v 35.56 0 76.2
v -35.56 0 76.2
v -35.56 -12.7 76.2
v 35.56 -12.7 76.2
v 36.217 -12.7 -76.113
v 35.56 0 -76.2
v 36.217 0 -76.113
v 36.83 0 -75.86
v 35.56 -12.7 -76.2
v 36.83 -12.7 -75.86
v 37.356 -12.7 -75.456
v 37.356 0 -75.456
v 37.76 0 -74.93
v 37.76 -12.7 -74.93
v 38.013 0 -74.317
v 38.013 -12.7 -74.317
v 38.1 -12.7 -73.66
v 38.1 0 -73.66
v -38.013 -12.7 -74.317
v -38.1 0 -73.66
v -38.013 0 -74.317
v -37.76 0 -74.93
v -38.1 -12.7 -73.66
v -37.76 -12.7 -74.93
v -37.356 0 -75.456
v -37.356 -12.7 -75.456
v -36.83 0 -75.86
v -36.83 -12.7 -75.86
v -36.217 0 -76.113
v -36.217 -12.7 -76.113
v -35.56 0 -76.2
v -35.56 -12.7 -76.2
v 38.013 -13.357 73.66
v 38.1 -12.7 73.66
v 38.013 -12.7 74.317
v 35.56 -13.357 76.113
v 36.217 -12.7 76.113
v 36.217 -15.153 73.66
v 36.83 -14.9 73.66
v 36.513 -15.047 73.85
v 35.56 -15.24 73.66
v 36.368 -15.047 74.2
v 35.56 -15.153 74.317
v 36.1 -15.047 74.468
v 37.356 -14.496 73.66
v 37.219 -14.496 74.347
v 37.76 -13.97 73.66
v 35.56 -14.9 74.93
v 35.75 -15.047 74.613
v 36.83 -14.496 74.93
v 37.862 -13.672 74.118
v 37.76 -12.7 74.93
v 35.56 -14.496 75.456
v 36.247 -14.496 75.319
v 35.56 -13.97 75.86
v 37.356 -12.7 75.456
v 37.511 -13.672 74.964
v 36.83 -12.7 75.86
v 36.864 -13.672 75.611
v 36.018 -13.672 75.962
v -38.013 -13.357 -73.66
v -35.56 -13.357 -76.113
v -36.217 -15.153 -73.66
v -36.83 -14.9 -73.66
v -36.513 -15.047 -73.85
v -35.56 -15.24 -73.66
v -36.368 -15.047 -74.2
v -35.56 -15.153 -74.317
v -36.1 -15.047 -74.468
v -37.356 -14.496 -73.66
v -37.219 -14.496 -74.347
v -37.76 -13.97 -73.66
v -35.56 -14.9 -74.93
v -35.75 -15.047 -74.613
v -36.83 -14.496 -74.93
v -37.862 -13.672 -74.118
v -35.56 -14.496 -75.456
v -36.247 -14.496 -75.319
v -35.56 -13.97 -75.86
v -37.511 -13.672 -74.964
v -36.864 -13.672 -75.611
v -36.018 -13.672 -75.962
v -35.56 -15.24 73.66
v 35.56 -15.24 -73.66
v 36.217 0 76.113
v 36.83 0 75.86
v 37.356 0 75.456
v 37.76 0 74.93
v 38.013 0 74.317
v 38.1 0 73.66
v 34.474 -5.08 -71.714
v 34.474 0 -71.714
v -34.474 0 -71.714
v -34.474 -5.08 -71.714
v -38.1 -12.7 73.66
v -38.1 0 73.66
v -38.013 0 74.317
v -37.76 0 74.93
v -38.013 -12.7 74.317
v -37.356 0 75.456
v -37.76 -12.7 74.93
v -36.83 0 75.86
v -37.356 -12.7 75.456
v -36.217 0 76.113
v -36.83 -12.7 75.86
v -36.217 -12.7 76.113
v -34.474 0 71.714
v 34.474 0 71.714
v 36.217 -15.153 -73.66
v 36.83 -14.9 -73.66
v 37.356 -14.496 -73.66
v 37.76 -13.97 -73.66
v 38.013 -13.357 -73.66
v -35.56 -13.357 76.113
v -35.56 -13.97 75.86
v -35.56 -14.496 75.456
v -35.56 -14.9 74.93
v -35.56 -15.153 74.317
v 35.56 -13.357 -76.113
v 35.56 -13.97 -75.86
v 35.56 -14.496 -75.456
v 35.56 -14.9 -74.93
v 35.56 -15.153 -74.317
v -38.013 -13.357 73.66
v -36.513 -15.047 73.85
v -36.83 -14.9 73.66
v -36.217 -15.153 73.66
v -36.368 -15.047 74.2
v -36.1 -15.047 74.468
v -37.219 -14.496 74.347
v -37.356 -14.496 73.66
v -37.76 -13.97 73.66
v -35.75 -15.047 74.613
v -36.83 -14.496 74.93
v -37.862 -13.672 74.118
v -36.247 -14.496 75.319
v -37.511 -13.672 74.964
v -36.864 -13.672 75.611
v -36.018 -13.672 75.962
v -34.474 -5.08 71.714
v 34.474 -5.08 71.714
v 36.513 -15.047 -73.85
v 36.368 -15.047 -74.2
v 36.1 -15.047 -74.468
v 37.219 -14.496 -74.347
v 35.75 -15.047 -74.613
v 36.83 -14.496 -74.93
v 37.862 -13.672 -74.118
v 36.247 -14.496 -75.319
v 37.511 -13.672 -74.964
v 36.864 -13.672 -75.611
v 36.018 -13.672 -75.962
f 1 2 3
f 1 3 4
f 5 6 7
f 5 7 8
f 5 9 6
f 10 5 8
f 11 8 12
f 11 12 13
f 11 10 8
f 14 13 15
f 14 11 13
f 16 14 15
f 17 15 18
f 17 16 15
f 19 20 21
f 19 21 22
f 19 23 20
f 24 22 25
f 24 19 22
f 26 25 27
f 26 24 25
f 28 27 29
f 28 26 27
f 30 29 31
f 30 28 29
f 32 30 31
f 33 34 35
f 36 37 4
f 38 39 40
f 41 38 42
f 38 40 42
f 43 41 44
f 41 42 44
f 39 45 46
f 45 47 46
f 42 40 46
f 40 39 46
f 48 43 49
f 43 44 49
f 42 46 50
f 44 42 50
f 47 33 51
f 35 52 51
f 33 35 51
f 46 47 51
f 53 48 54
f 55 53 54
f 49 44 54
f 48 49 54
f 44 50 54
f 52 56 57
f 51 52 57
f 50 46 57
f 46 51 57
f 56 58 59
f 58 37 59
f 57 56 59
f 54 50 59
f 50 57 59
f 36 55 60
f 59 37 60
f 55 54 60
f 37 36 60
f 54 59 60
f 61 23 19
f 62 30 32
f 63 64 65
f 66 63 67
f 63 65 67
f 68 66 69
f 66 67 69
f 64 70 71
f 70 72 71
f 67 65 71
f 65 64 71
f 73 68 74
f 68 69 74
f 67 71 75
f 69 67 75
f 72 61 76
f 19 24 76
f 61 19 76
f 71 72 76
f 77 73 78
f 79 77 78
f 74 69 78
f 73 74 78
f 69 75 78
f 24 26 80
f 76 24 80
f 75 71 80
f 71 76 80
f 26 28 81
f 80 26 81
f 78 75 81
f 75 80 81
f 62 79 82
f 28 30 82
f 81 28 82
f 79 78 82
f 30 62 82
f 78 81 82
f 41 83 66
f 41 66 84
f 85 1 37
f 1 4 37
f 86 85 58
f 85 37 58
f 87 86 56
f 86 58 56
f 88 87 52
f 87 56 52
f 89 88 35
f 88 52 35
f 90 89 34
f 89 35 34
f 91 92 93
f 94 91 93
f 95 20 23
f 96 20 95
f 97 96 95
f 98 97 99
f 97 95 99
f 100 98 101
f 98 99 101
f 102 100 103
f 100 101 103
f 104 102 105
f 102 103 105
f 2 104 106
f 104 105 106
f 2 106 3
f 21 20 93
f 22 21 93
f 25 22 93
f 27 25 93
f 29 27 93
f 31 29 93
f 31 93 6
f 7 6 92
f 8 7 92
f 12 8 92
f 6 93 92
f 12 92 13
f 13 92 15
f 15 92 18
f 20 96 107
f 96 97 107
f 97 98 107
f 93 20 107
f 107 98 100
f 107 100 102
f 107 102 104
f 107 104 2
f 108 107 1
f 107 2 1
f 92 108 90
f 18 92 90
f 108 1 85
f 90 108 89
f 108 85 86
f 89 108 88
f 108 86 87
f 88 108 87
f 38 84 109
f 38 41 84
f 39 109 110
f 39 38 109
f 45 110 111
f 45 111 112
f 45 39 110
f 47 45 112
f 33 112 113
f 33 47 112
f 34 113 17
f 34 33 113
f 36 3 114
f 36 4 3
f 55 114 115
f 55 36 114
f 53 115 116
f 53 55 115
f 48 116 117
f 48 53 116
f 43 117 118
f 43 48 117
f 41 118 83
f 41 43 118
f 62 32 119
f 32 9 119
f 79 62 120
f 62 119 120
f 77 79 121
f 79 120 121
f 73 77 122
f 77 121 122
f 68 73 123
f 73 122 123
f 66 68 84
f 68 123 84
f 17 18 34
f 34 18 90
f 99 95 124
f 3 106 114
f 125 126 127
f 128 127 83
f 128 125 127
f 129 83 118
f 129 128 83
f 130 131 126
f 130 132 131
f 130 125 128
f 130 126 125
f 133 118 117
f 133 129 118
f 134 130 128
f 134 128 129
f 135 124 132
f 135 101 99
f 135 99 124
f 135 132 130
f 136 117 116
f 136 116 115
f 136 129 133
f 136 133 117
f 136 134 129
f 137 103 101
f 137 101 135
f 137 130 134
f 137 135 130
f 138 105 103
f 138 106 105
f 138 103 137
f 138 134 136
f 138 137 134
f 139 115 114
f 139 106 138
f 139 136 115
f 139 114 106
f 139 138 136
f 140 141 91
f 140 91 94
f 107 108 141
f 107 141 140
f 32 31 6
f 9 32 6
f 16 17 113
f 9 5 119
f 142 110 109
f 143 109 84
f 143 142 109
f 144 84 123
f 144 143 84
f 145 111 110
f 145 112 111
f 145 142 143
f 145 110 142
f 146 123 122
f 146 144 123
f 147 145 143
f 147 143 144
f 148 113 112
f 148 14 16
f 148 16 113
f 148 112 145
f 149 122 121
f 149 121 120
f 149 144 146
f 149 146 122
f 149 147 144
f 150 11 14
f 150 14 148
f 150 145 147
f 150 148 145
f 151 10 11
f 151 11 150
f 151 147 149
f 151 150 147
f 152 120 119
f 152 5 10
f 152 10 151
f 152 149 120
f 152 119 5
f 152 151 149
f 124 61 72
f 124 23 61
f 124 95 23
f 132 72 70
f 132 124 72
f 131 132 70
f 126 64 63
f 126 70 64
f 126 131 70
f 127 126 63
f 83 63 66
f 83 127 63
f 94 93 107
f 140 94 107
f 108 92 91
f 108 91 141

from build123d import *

# Parameters (mm, degrees)
F0_W     = 76.2
F0_H     = 152.4
F1_DEPTH = 15.24
F2_W     = 68.948708
F2_H     = 143.428072
F3_DEPTH = 5.08
F4_R     = 2.54


with BuildPart() as f1:
    # F0 (on Front) → F1 (new body)
    with BuildSketch(Plane.XZ):
        Rectangle(F0_W, F0_H)
    extrude(amount=F1_DEPTH)

    # F2 (on face) → F3 (cut)
    with BuildSketch(Plane(origin=(0, 0, 0), x_dir=(-1, 0, 0), z_dir=(0, 1, 0))):
        Rectangle(F2_W, F2_H)
    extrude(amount=-F3_DEPTH, mode=Mode.SUBTRACT)

    # F4
    f4_edges = [f1.edges().sort_by_distance(p)[0] for p in [
        (-38.1, -7.62, -76.2),
        (38.1, -7.62, -76.2),
        (38.1, -7.62, 76.2),
        (-38.1, -7.62, 76.2),
        (-38.1, -15.24, 0),
        (38.1, -15.24, 0),
        (0, -15.24, 76.2),
        (0, -15.24, -76.2),
    ]]
    fillet(f4_edges, radius=F4_R)


solid = f1.part
